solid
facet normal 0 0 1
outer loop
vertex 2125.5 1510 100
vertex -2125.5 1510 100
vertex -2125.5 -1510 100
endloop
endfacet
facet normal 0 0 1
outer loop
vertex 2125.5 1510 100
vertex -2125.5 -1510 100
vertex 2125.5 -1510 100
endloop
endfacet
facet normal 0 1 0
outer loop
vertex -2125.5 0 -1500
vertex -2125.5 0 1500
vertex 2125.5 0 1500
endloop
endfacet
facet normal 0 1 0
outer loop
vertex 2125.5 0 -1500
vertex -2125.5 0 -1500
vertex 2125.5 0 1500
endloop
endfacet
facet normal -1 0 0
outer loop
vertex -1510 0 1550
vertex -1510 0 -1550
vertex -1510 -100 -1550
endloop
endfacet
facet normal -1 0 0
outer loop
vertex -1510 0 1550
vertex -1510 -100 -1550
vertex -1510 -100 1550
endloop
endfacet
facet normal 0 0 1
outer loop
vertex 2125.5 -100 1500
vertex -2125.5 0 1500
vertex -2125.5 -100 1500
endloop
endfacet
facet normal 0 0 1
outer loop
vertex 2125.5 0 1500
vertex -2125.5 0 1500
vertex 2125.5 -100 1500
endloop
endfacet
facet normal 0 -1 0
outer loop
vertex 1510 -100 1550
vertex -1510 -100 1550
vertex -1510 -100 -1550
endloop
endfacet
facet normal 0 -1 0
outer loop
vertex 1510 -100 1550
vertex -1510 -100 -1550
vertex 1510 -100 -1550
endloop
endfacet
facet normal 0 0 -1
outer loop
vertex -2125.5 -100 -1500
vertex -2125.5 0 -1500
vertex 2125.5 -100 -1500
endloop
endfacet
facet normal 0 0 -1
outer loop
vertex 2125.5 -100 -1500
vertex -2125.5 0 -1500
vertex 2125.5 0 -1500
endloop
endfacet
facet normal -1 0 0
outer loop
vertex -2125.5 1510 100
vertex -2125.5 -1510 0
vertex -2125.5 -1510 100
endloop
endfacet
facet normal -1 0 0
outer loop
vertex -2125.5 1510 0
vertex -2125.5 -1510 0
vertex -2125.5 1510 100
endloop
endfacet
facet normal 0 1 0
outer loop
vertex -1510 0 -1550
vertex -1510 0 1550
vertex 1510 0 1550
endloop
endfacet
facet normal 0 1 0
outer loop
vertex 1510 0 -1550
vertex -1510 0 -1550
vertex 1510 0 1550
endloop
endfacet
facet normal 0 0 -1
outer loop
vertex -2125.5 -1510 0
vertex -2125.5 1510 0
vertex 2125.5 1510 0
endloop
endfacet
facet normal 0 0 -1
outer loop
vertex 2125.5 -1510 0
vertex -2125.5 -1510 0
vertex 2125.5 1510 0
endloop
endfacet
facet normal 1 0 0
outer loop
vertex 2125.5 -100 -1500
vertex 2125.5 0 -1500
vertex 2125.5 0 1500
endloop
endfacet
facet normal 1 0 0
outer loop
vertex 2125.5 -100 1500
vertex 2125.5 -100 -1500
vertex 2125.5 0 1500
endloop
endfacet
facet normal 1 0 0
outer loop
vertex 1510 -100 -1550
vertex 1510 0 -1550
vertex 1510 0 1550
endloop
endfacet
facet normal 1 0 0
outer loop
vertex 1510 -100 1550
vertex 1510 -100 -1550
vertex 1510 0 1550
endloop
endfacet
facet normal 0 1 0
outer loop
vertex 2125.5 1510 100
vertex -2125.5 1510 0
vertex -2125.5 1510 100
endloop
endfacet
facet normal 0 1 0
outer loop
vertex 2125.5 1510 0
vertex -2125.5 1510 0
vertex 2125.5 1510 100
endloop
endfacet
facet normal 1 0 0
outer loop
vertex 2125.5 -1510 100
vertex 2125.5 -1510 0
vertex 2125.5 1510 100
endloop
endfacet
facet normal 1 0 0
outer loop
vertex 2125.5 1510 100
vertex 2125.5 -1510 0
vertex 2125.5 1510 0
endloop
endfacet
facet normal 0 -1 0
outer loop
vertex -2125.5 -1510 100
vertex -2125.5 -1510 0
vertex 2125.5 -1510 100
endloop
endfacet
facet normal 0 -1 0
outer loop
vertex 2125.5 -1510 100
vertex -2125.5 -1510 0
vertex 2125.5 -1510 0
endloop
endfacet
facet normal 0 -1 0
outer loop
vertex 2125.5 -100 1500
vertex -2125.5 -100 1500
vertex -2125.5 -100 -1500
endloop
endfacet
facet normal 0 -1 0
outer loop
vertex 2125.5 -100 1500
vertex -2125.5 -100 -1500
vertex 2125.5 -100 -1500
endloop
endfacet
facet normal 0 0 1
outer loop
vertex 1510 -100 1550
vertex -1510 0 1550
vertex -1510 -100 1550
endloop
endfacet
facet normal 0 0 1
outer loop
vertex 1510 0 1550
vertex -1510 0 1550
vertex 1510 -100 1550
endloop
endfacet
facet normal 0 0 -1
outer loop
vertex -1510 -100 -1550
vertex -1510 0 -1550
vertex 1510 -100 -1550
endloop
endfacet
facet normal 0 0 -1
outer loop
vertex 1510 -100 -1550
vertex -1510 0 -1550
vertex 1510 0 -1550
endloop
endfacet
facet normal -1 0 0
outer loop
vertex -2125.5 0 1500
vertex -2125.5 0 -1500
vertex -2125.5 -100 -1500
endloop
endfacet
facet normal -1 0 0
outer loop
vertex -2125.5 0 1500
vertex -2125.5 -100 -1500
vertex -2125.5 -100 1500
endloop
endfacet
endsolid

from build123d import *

# Parameters (mm, degrees)
F0_W     = 4251
F0_H     = 3000
F1_DEPTH = 100
F2_W     = 4251
F2_H     = 3020
F3_DEPTH = 100
F4_W     = 3020
F4_H     = 3100
F5_DEPTH = 100


with BuildPart() as f1:
    # F0 (on Front) → F1 (new body)
    with BuildSketch(Plane.XZ):
        Rectangle(F0_W, F0_H)
    extrude(amount=F1_DEPTH)


with BuildPart() as f3:
    # F2 (on Top) → F3 (new body)
    with BuildSketch(Plane.XY):
        Rectangle(F2_W, F2_H)
    extrude(amount=F3_DEPTH)


with BuildPart() as f5:
    # F4 (on Front) → F5 (new body)
    with BuildSketch(Plane.XZ):
        Rectangle(F4_W, F4_H)
    extrude(amount=F5_DEPTH)


solid = Compound([f1.part, f3.part, f5.part])
